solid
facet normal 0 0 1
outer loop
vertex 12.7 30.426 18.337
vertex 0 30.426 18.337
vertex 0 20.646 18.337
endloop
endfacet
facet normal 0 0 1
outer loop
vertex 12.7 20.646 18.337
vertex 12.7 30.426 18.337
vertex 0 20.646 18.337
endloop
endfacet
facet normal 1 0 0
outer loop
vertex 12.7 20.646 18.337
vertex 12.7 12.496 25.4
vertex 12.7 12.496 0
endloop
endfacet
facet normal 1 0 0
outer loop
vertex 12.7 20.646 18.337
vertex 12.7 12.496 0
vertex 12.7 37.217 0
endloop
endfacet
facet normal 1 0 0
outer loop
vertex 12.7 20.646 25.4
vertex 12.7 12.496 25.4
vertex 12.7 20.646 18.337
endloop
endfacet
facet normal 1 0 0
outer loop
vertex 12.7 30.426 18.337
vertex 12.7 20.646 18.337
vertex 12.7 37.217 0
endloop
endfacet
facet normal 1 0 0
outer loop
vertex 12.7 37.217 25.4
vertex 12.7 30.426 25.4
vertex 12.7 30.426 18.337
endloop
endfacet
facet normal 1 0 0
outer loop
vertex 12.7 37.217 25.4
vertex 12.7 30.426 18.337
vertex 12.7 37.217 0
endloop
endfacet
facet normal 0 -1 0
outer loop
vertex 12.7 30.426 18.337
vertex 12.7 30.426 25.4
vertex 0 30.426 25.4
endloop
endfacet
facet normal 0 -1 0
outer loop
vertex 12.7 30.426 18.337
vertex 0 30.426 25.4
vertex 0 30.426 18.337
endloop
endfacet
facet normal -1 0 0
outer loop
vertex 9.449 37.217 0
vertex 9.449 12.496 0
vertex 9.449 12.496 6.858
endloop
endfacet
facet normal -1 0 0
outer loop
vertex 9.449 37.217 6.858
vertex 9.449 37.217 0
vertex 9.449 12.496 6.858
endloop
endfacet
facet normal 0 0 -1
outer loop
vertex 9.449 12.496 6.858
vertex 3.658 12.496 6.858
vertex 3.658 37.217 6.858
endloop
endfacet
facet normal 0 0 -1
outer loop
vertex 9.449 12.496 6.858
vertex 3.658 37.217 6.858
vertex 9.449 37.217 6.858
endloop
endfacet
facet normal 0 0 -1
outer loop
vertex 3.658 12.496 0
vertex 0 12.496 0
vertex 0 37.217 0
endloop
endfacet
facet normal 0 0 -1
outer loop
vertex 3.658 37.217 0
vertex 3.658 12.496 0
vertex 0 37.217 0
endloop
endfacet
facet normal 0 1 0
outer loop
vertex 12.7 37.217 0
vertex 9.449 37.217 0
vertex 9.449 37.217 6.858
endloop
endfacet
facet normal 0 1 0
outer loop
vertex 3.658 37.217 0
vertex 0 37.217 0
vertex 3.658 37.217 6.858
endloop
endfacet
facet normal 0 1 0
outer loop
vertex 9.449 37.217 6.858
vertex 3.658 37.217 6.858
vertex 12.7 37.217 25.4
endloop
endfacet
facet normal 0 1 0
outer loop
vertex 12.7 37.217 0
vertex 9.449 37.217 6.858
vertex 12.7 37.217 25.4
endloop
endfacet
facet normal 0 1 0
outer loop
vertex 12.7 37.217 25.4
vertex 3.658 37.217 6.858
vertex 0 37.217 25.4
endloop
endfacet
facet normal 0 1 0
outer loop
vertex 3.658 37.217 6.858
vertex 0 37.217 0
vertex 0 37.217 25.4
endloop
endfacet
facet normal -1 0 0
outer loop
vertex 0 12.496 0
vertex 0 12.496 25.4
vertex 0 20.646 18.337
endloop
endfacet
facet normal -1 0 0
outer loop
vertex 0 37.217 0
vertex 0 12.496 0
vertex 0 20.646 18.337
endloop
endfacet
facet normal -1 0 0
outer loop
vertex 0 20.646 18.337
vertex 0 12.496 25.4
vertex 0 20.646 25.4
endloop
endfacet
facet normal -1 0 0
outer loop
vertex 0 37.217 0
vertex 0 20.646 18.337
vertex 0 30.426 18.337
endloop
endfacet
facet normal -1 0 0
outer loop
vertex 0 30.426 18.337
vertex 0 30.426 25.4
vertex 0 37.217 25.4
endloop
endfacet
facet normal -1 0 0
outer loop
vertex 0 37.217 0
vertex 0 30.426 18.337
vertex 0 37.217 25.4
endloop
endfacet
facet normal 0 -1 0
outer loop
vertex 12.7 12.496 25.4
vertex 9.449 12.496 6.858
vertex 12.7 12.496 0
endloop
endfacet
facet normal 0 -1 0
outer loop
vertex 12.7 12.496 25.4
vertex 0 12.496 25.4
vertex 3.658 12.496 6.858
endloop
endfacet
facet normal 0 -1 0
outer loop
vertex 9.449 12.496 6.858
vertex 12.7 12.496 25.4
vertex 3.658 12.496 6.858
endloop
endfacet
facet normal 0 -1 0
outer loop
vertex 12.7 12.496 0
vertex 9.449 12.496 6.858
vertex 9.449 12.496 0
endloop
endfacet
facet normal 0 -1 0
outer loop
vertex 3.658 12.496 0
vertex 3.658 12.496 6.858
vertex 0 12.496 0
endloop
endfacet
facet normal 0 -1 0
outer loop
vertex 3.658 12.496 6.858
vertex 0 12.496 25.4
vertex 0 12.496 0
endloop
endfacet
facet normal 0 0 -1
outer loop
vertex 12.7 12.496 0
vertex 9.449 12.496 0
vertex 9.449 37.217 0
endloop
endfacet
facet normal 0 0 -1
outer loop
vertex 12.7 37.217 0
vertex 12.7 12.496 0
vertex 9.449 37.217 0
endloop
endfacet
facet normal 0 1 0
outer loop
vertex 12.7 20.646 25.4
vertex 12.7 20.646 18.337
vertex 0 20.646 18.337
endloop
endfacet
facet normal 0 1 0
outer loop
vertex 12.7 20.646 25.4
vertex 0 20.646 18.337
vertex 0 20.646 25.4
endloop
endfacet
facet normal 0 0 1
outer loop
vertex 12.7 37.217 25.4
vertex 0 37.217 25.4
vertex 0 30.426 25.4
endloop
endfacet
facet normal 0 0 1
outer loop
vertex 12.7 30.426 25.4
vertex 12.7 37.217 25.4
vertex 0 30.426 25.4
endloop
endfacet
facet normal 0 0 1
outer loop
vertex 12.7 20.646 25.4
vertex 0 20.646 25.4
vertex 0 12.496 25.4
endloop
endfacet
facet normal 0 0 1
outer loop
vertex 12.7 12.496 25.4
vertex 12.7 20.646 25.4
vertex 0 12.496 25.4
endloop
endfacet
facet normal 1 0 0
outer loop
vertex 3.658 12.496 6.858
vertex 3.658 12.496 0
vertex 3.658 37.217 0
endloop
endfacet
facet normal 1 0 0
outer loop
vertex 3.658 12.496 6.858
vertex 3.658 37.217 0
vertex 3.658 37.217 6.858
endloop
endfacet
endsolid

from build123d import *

# Parameters (mm, degrees)
F1_DEPTH = 12.7
F4_W     = 5.7911989279
F4_H     = 6.8580000661
F5_DEPTH = 12.7
F6_DEPTH = 25.4


# Not quite as in the source:
# - a feature of the source that left no trace in its solid (it failed there, or was rolled back) is left out


with BuildPart() as f1:
    # F0 (on Right) → F1 (new body)
    with BuildSketch(Plane.YZ):
        Polygon((12.4962570041, 25.4), (12.4962570041, 0), (37.2171103641, 0), (37.2171103641, 25.4), (30.4256705266, 25.4), (30.4256705266, 18.3368995143), (20.6459868013, 18.3368995143), (20.6459868013, 25.4), align=None)
    extrude(amount=F1_DEPTH)

    # F4 (on Front) → F5 (cut)
    with BuildSketch(Plane.XZ):
        with Locations((6.553200772, 3.4290000331)):
            Rectangle(F4_W, F4_H)
    extrude(amount=-F5_DEPTH, mode=Mode.SUBTRACT)

    # F6 (cut): a face of the model
    f6_faces = [f1.faces().sort_by_distance(p)[0] for p in [
        (6.553200772, 12.7, 3.4290000331),
    ]]
    extrude(f6_faces, amount=-F6_DEPTH, mode=Mode.SUBTRACT)


solid = f1.part
